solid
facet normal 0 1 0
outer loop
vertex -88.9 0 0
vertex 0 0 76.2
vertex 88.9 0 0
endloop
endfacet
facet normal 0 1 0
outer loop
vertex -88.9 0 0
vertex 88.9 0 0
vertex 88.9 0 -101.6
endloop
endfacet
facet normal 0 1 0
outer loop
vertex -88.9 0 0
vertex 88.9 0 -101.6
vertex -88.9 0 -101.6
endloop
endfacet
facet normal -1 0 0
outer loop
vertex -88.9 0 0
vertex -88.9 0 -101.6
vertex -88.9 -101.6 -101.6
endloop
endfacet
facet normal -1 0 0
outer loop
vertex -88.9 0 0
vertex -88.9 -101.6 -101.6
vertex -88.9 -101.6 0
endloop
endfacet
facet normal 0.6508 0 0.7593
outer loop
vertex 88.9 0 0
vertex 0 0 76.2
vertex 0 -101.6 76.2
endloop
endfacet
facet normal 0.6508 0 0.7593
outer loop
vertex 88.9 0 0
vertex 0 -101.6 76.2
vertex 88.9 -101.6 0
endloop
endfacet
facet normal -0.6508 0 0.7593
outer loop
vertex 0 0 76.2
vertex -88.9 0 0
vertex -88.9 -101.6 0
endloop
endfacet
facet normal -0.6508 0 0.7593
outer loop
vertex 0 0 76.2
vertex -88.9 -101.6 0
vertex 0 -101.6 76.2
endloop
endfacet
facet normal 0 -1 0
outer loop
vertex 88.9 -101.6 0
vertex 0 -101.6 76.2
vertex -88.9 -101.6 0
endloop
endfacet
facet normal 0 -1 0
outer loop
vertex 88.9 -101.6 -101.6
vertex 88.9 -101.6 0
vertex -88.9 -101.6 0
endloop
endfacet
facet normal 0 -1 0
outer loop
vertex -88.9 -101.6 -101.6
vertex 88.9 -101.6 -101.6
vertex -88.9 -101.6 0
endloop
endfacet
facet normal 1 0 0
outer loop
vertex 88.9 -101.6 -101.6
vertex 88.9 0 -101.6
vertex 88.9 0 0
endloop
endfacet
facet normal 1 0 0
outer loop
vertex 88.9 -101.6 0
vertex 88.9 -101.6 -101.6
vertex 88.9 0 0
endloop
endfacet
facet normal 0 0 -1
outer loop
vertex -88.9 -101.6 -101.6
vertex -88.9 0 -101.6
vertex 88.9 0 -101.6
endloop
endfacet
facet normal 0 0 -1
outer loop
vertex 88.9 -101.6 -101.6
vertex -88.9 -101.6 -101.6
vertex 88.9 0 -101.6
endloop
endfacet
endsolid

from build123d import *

# Parameters (mm, degrees)
F0_W     = 177.8
F0_H     = 101.6
F1_DEPTH = 101.6
F3_DEPTH = 101.6


with BuildPart() as f1:
    # F0 (on Front) → F1 (new body)
    with BuildSketch(Plane.XZ):
        with Locations((0, -50.8)):
            Rectangle(F0_W, F0_H)
    extrude(amount=F1_DEPTH)

    # F2 (on face) → F3 (join, through all)
    with BuildSketch(Plane(origin=(0, 0, 0), x_dir=(-1, 0, 0), z_dir=(0, 1, 0))):
        Polygon((-88.9, 0), (88.9, 0), (0, 76.2), align=None)
    extrude(amount=-F3_DEPTH)


solid = f1.part
